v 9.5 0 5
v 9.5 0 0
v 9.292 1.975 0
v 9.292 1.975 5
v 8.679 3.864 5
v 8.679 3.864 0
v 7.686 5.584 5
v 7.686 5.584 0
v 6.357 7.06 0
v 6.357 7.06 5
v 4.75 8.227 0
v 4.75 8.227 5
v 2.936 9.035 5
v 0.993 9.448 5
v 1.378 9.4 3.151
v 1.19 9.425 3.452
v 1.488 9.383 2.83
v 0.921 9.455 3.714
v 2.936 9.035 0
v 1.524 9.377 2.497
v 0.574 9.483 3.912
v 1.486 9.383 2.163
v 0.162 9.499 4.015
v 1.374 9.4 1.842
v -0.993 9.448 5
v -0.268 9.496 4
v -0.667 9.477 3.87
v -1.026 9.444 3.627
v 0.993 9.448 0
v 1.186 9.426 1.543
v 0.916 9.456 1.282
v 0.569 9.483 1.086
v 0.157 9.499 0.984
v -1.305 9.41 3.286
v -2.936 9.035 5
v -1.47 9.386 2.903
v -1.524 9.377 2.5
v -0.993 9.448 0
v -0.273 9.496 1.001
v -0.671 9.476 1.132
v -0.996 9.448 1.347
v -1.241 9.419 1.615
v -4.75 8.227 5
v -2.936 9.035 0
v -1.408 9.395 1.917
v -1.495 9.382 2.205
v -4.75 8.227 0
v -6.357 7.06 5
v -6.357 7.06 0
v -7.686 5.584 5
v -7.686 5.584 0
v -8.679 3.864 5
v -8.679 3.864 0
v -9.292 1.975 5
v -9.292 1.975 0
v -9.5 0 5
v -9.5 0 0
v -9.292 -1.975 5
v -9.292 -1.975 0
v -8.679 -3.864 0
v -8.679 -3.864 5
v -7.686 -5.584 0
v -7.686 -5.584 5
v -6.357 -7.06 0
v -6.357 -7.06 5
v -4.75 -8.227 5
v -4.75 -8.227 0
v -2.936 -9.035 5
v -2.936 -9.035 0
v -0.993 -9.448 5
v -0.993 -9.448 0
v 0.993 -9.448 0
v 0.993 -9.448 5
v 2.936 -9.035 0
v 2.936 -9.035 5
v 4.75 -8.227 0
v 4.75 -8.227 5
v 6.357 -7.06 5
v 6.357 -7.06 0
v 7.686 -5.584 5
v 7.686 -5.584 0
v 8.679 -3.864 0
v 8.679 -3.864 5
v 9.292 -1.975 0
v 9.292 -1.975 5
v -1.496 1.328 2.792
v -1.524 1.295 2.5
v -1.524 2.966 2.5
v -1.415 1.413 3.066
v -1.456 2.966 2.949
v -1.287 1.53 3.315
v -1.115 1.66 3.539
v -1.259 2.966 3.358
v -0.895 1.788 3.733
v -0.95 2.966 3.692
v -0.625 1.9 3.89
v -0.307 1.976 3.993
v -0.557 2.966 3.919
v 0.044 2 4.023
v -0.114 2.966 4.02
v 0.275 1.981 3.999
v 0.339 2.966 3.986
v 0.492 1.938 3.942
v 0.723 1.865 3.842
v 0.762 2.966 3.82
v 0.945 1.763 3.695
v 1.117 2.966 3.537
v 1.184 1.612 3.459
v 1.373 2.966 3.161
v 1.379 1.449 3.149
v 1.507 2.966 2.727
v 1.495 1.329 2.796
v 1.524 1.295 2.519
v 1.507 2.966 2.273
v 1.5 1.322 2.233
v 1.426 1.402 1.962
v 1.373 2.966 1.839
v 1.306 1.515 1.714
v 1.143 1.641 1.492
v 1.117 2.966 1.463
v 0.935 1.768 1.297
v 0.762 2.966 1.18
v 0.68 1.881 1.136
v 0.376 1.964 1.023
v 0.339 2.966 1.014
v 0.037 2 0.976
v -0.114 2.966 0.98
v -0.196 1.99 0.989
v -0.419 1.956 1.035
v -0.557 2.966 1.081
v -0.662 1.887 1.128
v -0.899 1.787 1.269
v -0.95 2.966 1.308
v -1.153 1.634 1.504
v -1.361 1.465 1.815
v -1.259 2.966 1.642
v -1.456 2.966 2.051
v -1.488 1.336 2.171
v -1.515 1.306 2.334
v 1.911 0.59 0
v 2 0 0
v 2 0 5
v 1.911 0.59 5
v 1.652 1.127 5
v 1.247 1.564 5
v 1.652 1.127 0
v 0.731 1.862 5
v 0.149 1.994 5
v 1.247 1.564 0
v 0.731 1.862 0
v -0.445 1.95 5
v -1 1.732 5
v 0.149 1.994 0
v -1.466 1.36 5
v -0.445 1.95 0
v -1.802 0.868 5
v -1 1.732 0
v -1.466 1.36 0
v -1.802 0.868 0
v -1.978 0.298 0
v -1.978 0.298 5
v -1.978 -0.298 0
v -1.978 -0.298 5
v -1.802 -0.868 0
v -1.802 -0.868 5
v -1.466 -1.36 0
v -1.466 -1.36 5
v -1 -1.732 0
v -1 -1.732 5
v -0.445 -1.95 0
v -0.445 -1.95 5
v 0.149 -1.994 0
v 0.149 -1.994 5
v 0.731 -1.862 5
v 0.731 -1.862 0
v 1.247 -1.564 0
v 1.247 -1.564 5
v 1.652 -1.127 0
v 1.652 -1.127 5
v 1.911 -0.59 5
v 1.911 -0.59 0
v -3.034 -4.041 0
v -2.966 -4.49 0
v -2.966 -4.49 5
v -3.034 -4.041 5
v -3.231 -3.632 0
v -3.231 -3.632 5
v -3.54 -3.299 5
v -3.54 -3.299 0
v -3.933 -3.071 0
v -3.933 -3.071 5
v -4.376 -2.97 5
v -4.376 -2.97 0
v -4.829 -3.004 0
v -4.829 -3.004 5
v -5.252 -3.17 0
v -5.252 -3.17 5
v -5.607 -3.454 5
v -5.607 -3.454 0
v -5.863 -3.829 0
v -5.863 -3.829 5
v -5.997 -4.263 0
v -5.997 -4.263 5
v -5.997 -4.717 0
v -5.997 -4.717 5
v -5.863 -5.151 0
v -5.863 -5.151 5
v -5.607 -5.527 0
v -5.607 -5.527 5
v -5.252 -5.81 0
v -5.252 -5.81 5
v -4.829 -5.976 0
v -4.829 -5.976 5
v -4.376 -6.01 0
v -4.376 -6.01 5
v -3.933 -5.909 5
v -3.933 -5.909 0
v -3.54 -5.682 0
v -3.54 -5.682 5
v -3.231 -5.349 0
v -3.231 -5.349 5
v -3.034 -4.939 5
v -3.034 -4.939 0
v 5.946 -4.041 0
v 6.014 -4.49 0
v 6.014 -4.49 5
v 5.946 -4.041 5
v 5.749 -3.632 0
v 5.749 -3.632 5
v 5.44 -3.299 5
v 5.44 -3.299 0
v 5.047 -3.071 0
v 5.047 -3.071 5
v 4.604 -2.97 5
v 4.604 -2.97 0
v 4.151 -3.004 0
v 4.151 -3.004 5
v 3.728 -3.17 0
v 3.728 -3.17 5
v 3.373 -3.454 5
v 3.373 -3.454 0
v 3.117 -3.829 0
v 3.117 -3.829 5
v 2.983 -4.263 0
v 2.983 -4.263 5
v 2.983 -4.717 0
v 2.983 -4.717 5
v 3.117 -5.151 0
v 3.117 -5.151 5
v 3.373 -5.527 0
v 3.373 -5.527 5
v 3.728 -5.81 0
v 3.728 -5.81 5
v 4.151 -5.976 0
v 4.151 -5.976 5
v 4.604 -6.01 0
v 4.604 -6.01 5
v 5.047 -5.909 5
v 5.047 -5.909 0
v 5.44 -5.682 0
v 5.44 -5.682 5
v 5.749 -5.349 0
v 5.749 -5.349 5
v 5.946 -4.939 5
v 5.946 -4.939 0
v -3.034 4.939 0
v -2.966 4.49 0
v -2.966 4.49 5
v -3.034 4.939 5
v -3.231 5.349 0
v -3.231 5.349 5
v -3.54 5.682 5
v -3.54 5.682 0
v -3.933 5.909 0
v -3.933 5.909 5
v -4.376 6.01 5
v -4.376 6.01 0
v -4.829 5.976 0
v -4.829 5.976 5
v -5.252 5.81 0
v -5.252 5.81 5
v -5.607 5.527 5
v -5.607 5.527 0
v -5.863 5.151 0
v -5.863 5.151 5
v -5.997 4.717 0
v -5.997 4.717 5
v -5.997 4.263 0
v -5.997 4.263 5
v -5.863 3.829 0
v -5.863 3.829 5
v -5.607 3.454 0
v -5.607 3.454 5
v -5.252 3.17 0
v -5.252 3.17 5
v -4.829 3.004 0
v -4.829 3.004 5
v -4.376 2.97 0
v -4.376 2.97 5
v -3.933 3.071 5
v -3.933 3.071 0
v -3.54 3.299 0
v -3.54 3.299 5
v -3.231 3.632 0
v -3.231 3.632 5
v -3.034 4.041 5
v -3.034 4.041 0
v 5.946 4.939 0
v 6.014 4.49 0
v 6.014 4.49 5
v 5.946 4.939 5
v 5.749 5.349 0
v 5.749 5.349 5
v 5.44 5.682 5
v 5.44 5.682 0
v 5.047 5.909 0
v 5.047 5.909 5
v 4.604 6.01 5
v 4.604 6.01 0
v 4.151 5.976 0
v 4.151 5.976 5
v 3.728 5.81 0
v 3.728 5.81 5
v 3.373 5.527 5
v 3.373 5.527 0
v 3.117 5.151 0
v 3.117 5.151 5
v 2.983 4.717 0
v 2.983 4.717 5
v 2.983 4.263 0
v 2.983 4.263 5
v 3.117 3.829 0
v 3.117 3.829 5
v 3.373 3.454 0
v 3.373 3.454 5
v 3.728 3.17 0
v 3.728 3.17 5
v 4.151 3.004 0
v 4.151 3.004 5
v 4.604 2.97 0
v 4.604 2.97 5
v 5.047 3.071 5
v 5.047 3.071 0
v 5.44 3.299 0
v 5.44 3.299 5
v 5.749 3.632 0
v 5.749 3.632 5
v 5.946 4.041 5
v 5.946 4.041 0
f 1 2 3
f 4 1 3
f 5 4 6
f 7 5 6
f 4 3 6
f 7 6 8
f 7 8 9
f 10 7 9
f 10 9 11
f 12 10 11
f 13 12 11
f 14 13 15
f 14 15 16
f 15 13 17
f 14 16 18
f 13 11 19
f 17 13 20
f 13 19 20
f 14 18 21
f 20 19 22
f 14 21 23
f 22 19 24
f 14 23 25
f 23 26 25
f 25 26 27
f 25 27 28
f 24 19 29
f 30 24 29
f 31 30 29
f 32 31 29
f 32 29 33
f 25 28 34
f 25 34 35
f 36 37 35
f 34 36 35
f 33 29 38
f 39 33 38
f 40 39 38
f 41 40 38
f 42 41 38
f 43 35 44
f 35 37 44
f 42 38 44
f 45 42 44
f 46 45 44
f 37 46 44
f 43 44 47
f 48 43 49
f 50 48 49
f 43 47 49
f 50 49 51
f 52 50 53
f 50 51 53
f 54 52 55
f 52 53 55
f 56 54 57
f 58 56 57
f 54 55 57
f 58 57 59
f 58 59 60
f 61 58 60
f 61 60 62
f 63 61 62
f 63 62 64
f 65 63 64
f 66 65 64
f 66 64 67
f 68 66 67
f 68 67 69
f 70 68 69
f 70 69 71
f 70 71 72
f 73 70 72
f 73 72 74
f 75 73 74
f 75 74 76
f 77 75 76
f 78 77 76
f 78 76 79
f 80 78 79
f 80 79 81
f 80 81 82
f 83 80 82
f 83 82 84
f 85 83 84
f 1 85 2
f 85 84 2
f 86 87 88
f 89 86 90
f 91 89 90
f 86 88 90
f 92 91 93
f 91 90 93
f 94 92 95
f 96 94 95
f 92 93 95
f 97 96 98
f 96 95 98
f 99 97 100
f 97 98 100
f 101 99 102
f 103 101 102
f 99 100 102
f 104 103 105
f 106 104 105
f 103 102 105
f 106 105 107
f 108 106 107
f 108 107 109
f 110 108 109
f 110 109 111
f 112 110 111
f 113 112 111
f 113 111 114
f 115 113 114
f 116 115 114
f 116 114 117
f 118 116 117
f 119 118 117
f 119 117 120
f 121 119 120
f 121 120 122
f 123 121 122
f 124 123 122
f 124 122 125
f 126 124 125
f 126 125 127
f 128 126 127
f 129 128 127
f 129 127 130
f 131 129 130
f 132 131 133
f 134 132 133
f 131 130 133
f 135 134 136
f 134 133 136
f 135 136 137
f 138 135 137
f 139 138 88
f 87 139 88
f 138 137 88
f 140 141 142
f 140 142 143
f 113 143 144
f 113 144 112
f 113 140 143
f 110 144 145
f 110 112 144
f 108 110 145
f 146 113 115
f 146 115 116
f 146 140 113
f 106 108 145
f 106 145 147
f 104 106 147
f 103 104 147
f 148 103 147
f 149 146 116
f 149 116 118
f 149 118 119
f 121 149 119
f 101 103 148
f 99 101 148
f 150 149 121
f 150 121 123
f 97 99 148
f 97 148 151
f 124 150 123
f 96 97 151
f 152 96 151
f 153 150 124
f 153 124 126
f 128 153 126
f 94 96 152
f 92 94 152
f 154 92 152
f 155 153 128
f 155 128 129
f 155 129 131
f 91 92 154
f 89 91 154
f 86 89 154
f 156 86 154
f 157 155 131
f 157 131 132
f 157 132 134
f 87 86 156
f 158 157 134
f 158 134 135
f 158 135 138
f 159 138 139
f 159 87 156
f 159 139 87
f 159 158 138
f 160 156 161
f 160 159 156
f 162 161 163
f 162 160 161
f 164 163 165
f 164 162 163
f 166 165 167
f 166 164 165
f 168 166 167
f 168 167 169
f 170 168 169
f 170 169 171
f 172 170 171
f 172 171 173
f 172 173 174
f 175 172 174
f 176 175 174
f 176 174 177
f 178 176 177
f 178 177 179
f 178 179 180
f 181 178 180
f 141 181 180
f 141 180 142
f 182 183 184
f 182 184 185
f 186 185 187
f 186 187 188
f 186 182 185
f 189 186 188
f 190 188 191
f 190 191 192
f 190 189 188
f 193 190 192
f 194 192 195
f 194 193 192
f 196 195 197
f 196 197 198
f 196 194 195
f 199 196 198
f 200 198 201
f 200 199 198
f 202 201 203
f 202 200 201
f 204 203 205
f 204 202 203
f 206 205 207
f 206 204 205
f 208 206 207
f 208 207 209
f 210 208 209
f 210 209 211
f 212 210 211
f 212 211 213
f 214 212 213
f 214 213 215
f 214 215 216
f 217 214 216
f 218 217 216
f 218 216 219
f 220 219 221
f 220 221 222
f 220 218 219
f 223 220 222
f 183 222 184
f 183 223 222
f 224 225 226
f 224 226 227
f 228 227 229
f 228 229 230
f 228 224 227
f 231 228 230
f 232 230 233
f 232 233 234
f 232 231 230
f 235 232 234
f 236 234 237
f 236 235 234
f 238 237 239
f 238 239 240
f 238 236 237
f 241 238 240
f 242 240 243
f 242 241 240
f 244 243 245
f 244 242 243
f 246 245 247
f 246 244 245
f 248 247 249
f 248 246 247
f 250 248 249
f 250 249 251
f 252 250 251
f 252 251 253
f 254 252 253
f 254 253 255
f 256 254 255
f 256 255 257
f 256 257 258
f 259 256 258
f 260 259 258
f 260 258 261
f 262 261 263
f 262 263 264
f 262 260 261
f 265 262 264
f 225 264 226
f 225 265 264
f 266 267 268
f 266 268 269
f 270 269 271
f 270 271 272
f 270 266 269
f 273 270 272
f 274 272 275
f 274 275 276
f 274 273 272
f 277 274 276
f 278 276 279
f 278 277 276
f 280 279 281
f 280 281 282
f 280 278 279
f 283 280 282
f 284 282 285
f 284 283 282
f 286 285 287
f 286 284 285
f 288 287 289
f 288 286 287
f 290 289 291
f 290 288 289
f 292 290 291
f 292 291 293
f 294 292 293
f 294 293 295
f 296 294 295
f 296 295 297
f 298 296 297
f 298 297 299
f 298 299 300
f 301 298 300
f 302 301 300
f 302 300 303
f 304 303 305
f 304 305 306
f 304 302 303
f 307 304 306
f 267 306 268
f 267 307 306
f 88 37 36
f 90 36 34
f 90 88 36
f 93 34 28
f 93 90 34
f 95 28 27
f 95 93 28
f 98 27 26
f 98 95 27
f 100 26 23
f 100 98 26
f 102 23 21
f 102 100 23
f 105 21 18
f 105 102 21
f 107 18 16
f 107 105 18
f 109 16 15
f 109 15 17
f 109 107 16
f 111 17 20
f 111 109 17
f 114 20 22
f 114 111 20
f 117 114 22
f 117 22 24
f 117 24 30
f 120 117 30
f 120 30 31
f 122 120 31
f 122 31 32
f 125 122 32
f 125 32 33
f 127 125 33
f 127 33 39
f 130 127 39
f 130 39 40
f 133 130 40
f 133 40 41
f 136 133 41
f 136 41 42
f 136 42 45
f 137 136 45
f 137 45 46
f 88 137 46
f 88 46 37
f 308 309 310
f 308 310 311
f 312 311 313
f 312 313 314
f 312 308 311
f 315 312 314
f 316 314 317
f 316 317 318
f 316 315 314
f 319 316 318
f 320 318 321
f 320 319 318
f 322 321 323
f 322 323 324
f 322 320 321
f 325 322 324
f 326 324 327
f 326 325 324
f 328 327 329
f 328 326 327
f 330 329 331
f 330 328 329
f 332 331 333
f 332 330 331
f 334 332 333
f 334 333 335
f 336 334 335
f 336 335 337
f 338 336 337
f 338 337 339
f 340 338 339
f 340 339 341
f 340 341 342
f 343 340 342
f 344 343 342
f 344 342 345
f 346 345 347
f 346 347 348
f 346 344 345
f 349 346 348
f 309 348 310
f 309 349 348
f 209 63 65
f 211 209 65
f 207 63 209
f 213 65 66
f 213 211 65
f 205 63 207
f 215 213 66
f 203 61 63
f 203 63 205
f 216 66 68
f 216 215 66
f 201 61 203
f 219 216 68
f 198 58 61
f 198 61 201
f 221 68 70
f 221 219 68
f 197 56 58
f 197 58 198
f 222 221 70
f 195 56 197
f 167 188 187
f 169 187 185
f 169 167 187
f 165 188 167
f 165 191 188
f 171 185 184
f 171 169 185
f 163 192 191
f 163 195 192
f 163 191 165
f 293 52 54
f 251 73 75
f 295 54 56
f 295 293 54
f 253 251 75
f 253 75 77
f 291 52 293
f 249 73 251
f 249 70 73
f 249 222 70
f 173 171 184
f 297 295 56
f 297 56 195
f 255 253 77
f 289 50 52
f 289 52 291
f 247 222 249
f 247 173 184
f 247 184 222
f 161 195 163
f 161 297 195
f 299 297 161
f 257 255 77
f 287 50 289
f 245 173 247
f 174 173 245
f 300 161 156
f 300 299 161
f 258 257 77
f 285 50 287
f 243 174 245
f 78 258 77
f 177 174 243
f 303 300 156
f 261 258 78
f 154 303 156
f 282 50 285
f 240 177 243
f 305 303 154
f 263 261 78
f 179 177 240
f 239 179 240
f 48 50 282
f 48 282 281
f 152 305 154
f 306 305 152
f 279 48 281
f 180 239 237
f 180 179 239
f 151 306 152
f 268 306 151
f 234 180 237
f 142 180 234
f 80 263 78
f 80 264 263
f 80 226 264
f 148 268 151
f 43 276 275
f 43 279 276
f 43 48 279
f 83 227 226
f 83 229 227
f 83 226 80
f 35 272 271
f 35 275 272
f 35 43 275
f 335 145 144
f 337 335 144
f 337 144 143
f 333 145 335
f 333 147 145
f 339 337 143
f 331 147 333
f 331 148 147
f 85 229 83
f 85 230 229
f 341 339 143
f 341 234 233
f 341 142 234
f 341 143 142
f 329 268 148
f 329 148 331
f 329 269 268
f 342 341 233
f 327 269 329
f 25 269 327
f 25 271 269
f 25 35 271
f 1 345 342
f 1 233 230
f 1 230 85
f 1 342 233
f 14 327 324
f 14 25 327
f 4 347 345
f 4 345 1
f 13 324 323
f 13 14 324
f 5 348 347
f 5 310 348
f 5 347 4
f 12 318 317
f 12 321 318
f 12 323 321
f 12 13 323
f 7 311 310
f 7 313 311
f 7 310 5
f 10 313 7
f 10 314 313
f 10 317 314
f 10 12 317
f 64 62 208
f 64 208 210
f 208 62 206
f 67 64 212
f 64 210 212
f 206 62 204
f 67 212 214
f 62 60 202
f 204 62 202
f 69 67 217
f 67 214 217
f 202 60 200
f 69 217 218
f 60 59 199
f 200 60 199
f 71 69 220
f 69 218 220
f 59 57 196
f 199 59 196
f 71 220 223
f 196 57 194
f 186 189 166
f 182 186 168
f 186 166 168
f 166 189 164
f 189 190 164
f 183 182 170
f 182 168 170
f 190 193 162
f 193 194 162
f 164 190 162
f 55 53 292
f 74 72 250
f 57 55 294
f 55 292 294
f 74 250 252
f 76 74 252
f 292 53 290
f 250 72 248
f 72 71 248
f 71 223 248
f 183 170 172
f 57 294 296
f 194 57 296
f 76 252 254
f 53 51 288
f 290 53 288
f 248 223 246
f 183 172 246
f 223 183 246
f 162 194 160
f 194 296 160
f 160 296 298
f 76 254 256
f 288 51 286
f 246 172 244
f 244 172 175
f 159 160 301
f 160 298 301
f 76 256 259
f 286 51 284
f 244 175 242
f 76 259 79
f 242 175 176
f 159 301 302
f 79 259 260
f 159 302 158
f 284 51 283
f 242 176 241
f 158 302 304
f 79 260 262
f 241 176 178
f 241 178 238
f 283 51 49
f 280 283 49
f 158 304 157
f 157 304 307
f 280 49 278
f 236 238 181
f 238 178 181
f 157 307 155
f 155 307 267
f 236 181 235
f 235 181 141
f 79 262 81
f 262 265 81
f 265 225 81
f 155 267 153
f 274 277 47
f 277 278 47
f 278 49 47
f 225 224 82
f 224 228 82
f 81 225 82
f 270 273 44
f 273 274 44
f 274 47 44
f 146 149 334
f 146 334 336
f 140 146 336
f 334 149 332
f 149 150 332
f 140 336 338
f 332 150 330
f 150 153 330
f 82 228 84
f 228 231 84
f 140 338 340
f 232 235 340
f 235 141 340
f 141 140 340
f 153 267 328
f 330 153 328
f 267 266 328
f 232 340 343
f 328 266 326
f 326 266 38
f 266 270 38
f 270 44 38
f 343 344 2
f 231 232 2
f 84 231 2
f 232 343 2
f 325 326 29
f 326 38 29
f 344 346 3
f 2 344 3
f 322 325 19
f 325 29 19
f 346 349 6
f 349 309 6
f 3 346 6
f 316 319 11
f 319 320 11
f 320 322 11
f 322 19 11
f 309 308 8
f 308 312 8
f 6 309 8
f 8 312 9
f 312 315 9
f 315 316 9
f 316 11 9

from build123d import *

# Parameters (mm, degrees)
SKETCH1_R                           = 9.5
SKETCH1_R_2                         = 1.524
SKETCH1_R_3                         = 2
BOSS_EXTRUDE1_DEPTH                 = 5
CUT_EXTRUDE1_REACH                  = 18.452
CUT_EXTRUDE1_END_RADIUS             = 2
SKETCH3_R                           = 1.524
CUT_EXTRUDE1_DIRECTION_2_REACH      = 18.452
CUT_EXTRUDE1_DIRECTION_2_END_RADIUS = 9.5


with BuildPart() as part:
    # Sketch1 → Boss-Extrude1 (new body)
    with BuildSketch(Plane.XY):
        Circle(SKETCH1_R)
        with Locations((4.490128061, -4.490128061)):
            Circle(SKETCH1_R_2, mode=Mode.SUBTRACT)
        with Locations((-4.490128061, -4.490128061)):
            Circle(SKETCH1_R_2, mode=Mode.SUBTRACT)
        with Locations((-4.490128061, 4.490128061)):
            Circle(SKETCH1_R_2, mode=Mode.SUBTRACT)
        with Locations((4.490128061, 4.490128061)):
            Circle(SKETCH1_R_2, mode=Mode.SUBTRACT)
        Circle(SKETCH1_R_3, mode=Mode.SUBTRACT)
    extrude(amount=BOSS_EXTRUDE1_DEPTH)

    # Cut-Extrude1: up to this cylinder (the profile starts outside it)
    cut_extrude1_end = Plane(origin=(0, 0, 2.5), z_dir=(0, 0, -1)) * Cylinder(CUT_EXTRUDE1_END_RADIUS, 41.904, mode=Mode.PRIVATE)
    # Sketch3 → Cut-Extrude1 (cut, up to the surface)
    with BuildSketch(Plane(origin=(0, 2.966128061, 0), x_dir=(1, 0, 0), z_dir=(0, 1, 0)), mode=Mode.PRIVATE) as cut_extrude1_sk1:
        with Locations(Location((0, -2.5, 0), (0, 0, 180))):
            Circle(SKETCH3_R)
    cut_extrude1_tool1 = extrude(cut_extrude1_sk1.sketch, amount=-CUT_EXTRUDE1_REACH, mode=Mode.PRIVATE) - cut_extrude1_end
    add(cut_extrude1_tool1.solids().sort_by_distance((0, 2.966128, 2.5))[0], mode=Mode.SUBTRACT)

    # Cut-Extrude1 direction 2: up to this cylinder (the profile starts inside it)
    cut_extrude1_direction_2_end = Plane(origin=(0, 0, 2.5), z_dir=(0, 0, -1)) * Cylinder(CUT_EXTRUDE1_DIRECTION_2_END_RADIUS, 56.904, mode=Mode.PRIVATE)
    # Sketch3 → Cut-Extrude1 direction 2 (cut, up to the surface)
    with BuildSketch(Plane(origin=(0, 2.966128061, 0), x_dir=(1, 0, 0), z_dir=(0, 1, 0)), mode=Mode.PRIVATE) as cut_extrude1_direction_2_sk1:
        with Locations(Location((0, -2.5, 0), (0, 0, 180))):
            Circle(SKETCH3_R)
    cut_extrude1_direction_2_tool1 = extrude(cut_extrude1_direction_2_sk1.sketch, amount=CUT_EXTRUDE1_DIRECTION_2_REACH, mode=Mode.PRIVATE) & cut_extrude1_direction_2_end
    add(cut_extrude1_direction_2_tool1.solids().sort_by_distance((0, 2.966128, 2.5))[0], mode=Mode.SUBTRACT)


solid = part.part
